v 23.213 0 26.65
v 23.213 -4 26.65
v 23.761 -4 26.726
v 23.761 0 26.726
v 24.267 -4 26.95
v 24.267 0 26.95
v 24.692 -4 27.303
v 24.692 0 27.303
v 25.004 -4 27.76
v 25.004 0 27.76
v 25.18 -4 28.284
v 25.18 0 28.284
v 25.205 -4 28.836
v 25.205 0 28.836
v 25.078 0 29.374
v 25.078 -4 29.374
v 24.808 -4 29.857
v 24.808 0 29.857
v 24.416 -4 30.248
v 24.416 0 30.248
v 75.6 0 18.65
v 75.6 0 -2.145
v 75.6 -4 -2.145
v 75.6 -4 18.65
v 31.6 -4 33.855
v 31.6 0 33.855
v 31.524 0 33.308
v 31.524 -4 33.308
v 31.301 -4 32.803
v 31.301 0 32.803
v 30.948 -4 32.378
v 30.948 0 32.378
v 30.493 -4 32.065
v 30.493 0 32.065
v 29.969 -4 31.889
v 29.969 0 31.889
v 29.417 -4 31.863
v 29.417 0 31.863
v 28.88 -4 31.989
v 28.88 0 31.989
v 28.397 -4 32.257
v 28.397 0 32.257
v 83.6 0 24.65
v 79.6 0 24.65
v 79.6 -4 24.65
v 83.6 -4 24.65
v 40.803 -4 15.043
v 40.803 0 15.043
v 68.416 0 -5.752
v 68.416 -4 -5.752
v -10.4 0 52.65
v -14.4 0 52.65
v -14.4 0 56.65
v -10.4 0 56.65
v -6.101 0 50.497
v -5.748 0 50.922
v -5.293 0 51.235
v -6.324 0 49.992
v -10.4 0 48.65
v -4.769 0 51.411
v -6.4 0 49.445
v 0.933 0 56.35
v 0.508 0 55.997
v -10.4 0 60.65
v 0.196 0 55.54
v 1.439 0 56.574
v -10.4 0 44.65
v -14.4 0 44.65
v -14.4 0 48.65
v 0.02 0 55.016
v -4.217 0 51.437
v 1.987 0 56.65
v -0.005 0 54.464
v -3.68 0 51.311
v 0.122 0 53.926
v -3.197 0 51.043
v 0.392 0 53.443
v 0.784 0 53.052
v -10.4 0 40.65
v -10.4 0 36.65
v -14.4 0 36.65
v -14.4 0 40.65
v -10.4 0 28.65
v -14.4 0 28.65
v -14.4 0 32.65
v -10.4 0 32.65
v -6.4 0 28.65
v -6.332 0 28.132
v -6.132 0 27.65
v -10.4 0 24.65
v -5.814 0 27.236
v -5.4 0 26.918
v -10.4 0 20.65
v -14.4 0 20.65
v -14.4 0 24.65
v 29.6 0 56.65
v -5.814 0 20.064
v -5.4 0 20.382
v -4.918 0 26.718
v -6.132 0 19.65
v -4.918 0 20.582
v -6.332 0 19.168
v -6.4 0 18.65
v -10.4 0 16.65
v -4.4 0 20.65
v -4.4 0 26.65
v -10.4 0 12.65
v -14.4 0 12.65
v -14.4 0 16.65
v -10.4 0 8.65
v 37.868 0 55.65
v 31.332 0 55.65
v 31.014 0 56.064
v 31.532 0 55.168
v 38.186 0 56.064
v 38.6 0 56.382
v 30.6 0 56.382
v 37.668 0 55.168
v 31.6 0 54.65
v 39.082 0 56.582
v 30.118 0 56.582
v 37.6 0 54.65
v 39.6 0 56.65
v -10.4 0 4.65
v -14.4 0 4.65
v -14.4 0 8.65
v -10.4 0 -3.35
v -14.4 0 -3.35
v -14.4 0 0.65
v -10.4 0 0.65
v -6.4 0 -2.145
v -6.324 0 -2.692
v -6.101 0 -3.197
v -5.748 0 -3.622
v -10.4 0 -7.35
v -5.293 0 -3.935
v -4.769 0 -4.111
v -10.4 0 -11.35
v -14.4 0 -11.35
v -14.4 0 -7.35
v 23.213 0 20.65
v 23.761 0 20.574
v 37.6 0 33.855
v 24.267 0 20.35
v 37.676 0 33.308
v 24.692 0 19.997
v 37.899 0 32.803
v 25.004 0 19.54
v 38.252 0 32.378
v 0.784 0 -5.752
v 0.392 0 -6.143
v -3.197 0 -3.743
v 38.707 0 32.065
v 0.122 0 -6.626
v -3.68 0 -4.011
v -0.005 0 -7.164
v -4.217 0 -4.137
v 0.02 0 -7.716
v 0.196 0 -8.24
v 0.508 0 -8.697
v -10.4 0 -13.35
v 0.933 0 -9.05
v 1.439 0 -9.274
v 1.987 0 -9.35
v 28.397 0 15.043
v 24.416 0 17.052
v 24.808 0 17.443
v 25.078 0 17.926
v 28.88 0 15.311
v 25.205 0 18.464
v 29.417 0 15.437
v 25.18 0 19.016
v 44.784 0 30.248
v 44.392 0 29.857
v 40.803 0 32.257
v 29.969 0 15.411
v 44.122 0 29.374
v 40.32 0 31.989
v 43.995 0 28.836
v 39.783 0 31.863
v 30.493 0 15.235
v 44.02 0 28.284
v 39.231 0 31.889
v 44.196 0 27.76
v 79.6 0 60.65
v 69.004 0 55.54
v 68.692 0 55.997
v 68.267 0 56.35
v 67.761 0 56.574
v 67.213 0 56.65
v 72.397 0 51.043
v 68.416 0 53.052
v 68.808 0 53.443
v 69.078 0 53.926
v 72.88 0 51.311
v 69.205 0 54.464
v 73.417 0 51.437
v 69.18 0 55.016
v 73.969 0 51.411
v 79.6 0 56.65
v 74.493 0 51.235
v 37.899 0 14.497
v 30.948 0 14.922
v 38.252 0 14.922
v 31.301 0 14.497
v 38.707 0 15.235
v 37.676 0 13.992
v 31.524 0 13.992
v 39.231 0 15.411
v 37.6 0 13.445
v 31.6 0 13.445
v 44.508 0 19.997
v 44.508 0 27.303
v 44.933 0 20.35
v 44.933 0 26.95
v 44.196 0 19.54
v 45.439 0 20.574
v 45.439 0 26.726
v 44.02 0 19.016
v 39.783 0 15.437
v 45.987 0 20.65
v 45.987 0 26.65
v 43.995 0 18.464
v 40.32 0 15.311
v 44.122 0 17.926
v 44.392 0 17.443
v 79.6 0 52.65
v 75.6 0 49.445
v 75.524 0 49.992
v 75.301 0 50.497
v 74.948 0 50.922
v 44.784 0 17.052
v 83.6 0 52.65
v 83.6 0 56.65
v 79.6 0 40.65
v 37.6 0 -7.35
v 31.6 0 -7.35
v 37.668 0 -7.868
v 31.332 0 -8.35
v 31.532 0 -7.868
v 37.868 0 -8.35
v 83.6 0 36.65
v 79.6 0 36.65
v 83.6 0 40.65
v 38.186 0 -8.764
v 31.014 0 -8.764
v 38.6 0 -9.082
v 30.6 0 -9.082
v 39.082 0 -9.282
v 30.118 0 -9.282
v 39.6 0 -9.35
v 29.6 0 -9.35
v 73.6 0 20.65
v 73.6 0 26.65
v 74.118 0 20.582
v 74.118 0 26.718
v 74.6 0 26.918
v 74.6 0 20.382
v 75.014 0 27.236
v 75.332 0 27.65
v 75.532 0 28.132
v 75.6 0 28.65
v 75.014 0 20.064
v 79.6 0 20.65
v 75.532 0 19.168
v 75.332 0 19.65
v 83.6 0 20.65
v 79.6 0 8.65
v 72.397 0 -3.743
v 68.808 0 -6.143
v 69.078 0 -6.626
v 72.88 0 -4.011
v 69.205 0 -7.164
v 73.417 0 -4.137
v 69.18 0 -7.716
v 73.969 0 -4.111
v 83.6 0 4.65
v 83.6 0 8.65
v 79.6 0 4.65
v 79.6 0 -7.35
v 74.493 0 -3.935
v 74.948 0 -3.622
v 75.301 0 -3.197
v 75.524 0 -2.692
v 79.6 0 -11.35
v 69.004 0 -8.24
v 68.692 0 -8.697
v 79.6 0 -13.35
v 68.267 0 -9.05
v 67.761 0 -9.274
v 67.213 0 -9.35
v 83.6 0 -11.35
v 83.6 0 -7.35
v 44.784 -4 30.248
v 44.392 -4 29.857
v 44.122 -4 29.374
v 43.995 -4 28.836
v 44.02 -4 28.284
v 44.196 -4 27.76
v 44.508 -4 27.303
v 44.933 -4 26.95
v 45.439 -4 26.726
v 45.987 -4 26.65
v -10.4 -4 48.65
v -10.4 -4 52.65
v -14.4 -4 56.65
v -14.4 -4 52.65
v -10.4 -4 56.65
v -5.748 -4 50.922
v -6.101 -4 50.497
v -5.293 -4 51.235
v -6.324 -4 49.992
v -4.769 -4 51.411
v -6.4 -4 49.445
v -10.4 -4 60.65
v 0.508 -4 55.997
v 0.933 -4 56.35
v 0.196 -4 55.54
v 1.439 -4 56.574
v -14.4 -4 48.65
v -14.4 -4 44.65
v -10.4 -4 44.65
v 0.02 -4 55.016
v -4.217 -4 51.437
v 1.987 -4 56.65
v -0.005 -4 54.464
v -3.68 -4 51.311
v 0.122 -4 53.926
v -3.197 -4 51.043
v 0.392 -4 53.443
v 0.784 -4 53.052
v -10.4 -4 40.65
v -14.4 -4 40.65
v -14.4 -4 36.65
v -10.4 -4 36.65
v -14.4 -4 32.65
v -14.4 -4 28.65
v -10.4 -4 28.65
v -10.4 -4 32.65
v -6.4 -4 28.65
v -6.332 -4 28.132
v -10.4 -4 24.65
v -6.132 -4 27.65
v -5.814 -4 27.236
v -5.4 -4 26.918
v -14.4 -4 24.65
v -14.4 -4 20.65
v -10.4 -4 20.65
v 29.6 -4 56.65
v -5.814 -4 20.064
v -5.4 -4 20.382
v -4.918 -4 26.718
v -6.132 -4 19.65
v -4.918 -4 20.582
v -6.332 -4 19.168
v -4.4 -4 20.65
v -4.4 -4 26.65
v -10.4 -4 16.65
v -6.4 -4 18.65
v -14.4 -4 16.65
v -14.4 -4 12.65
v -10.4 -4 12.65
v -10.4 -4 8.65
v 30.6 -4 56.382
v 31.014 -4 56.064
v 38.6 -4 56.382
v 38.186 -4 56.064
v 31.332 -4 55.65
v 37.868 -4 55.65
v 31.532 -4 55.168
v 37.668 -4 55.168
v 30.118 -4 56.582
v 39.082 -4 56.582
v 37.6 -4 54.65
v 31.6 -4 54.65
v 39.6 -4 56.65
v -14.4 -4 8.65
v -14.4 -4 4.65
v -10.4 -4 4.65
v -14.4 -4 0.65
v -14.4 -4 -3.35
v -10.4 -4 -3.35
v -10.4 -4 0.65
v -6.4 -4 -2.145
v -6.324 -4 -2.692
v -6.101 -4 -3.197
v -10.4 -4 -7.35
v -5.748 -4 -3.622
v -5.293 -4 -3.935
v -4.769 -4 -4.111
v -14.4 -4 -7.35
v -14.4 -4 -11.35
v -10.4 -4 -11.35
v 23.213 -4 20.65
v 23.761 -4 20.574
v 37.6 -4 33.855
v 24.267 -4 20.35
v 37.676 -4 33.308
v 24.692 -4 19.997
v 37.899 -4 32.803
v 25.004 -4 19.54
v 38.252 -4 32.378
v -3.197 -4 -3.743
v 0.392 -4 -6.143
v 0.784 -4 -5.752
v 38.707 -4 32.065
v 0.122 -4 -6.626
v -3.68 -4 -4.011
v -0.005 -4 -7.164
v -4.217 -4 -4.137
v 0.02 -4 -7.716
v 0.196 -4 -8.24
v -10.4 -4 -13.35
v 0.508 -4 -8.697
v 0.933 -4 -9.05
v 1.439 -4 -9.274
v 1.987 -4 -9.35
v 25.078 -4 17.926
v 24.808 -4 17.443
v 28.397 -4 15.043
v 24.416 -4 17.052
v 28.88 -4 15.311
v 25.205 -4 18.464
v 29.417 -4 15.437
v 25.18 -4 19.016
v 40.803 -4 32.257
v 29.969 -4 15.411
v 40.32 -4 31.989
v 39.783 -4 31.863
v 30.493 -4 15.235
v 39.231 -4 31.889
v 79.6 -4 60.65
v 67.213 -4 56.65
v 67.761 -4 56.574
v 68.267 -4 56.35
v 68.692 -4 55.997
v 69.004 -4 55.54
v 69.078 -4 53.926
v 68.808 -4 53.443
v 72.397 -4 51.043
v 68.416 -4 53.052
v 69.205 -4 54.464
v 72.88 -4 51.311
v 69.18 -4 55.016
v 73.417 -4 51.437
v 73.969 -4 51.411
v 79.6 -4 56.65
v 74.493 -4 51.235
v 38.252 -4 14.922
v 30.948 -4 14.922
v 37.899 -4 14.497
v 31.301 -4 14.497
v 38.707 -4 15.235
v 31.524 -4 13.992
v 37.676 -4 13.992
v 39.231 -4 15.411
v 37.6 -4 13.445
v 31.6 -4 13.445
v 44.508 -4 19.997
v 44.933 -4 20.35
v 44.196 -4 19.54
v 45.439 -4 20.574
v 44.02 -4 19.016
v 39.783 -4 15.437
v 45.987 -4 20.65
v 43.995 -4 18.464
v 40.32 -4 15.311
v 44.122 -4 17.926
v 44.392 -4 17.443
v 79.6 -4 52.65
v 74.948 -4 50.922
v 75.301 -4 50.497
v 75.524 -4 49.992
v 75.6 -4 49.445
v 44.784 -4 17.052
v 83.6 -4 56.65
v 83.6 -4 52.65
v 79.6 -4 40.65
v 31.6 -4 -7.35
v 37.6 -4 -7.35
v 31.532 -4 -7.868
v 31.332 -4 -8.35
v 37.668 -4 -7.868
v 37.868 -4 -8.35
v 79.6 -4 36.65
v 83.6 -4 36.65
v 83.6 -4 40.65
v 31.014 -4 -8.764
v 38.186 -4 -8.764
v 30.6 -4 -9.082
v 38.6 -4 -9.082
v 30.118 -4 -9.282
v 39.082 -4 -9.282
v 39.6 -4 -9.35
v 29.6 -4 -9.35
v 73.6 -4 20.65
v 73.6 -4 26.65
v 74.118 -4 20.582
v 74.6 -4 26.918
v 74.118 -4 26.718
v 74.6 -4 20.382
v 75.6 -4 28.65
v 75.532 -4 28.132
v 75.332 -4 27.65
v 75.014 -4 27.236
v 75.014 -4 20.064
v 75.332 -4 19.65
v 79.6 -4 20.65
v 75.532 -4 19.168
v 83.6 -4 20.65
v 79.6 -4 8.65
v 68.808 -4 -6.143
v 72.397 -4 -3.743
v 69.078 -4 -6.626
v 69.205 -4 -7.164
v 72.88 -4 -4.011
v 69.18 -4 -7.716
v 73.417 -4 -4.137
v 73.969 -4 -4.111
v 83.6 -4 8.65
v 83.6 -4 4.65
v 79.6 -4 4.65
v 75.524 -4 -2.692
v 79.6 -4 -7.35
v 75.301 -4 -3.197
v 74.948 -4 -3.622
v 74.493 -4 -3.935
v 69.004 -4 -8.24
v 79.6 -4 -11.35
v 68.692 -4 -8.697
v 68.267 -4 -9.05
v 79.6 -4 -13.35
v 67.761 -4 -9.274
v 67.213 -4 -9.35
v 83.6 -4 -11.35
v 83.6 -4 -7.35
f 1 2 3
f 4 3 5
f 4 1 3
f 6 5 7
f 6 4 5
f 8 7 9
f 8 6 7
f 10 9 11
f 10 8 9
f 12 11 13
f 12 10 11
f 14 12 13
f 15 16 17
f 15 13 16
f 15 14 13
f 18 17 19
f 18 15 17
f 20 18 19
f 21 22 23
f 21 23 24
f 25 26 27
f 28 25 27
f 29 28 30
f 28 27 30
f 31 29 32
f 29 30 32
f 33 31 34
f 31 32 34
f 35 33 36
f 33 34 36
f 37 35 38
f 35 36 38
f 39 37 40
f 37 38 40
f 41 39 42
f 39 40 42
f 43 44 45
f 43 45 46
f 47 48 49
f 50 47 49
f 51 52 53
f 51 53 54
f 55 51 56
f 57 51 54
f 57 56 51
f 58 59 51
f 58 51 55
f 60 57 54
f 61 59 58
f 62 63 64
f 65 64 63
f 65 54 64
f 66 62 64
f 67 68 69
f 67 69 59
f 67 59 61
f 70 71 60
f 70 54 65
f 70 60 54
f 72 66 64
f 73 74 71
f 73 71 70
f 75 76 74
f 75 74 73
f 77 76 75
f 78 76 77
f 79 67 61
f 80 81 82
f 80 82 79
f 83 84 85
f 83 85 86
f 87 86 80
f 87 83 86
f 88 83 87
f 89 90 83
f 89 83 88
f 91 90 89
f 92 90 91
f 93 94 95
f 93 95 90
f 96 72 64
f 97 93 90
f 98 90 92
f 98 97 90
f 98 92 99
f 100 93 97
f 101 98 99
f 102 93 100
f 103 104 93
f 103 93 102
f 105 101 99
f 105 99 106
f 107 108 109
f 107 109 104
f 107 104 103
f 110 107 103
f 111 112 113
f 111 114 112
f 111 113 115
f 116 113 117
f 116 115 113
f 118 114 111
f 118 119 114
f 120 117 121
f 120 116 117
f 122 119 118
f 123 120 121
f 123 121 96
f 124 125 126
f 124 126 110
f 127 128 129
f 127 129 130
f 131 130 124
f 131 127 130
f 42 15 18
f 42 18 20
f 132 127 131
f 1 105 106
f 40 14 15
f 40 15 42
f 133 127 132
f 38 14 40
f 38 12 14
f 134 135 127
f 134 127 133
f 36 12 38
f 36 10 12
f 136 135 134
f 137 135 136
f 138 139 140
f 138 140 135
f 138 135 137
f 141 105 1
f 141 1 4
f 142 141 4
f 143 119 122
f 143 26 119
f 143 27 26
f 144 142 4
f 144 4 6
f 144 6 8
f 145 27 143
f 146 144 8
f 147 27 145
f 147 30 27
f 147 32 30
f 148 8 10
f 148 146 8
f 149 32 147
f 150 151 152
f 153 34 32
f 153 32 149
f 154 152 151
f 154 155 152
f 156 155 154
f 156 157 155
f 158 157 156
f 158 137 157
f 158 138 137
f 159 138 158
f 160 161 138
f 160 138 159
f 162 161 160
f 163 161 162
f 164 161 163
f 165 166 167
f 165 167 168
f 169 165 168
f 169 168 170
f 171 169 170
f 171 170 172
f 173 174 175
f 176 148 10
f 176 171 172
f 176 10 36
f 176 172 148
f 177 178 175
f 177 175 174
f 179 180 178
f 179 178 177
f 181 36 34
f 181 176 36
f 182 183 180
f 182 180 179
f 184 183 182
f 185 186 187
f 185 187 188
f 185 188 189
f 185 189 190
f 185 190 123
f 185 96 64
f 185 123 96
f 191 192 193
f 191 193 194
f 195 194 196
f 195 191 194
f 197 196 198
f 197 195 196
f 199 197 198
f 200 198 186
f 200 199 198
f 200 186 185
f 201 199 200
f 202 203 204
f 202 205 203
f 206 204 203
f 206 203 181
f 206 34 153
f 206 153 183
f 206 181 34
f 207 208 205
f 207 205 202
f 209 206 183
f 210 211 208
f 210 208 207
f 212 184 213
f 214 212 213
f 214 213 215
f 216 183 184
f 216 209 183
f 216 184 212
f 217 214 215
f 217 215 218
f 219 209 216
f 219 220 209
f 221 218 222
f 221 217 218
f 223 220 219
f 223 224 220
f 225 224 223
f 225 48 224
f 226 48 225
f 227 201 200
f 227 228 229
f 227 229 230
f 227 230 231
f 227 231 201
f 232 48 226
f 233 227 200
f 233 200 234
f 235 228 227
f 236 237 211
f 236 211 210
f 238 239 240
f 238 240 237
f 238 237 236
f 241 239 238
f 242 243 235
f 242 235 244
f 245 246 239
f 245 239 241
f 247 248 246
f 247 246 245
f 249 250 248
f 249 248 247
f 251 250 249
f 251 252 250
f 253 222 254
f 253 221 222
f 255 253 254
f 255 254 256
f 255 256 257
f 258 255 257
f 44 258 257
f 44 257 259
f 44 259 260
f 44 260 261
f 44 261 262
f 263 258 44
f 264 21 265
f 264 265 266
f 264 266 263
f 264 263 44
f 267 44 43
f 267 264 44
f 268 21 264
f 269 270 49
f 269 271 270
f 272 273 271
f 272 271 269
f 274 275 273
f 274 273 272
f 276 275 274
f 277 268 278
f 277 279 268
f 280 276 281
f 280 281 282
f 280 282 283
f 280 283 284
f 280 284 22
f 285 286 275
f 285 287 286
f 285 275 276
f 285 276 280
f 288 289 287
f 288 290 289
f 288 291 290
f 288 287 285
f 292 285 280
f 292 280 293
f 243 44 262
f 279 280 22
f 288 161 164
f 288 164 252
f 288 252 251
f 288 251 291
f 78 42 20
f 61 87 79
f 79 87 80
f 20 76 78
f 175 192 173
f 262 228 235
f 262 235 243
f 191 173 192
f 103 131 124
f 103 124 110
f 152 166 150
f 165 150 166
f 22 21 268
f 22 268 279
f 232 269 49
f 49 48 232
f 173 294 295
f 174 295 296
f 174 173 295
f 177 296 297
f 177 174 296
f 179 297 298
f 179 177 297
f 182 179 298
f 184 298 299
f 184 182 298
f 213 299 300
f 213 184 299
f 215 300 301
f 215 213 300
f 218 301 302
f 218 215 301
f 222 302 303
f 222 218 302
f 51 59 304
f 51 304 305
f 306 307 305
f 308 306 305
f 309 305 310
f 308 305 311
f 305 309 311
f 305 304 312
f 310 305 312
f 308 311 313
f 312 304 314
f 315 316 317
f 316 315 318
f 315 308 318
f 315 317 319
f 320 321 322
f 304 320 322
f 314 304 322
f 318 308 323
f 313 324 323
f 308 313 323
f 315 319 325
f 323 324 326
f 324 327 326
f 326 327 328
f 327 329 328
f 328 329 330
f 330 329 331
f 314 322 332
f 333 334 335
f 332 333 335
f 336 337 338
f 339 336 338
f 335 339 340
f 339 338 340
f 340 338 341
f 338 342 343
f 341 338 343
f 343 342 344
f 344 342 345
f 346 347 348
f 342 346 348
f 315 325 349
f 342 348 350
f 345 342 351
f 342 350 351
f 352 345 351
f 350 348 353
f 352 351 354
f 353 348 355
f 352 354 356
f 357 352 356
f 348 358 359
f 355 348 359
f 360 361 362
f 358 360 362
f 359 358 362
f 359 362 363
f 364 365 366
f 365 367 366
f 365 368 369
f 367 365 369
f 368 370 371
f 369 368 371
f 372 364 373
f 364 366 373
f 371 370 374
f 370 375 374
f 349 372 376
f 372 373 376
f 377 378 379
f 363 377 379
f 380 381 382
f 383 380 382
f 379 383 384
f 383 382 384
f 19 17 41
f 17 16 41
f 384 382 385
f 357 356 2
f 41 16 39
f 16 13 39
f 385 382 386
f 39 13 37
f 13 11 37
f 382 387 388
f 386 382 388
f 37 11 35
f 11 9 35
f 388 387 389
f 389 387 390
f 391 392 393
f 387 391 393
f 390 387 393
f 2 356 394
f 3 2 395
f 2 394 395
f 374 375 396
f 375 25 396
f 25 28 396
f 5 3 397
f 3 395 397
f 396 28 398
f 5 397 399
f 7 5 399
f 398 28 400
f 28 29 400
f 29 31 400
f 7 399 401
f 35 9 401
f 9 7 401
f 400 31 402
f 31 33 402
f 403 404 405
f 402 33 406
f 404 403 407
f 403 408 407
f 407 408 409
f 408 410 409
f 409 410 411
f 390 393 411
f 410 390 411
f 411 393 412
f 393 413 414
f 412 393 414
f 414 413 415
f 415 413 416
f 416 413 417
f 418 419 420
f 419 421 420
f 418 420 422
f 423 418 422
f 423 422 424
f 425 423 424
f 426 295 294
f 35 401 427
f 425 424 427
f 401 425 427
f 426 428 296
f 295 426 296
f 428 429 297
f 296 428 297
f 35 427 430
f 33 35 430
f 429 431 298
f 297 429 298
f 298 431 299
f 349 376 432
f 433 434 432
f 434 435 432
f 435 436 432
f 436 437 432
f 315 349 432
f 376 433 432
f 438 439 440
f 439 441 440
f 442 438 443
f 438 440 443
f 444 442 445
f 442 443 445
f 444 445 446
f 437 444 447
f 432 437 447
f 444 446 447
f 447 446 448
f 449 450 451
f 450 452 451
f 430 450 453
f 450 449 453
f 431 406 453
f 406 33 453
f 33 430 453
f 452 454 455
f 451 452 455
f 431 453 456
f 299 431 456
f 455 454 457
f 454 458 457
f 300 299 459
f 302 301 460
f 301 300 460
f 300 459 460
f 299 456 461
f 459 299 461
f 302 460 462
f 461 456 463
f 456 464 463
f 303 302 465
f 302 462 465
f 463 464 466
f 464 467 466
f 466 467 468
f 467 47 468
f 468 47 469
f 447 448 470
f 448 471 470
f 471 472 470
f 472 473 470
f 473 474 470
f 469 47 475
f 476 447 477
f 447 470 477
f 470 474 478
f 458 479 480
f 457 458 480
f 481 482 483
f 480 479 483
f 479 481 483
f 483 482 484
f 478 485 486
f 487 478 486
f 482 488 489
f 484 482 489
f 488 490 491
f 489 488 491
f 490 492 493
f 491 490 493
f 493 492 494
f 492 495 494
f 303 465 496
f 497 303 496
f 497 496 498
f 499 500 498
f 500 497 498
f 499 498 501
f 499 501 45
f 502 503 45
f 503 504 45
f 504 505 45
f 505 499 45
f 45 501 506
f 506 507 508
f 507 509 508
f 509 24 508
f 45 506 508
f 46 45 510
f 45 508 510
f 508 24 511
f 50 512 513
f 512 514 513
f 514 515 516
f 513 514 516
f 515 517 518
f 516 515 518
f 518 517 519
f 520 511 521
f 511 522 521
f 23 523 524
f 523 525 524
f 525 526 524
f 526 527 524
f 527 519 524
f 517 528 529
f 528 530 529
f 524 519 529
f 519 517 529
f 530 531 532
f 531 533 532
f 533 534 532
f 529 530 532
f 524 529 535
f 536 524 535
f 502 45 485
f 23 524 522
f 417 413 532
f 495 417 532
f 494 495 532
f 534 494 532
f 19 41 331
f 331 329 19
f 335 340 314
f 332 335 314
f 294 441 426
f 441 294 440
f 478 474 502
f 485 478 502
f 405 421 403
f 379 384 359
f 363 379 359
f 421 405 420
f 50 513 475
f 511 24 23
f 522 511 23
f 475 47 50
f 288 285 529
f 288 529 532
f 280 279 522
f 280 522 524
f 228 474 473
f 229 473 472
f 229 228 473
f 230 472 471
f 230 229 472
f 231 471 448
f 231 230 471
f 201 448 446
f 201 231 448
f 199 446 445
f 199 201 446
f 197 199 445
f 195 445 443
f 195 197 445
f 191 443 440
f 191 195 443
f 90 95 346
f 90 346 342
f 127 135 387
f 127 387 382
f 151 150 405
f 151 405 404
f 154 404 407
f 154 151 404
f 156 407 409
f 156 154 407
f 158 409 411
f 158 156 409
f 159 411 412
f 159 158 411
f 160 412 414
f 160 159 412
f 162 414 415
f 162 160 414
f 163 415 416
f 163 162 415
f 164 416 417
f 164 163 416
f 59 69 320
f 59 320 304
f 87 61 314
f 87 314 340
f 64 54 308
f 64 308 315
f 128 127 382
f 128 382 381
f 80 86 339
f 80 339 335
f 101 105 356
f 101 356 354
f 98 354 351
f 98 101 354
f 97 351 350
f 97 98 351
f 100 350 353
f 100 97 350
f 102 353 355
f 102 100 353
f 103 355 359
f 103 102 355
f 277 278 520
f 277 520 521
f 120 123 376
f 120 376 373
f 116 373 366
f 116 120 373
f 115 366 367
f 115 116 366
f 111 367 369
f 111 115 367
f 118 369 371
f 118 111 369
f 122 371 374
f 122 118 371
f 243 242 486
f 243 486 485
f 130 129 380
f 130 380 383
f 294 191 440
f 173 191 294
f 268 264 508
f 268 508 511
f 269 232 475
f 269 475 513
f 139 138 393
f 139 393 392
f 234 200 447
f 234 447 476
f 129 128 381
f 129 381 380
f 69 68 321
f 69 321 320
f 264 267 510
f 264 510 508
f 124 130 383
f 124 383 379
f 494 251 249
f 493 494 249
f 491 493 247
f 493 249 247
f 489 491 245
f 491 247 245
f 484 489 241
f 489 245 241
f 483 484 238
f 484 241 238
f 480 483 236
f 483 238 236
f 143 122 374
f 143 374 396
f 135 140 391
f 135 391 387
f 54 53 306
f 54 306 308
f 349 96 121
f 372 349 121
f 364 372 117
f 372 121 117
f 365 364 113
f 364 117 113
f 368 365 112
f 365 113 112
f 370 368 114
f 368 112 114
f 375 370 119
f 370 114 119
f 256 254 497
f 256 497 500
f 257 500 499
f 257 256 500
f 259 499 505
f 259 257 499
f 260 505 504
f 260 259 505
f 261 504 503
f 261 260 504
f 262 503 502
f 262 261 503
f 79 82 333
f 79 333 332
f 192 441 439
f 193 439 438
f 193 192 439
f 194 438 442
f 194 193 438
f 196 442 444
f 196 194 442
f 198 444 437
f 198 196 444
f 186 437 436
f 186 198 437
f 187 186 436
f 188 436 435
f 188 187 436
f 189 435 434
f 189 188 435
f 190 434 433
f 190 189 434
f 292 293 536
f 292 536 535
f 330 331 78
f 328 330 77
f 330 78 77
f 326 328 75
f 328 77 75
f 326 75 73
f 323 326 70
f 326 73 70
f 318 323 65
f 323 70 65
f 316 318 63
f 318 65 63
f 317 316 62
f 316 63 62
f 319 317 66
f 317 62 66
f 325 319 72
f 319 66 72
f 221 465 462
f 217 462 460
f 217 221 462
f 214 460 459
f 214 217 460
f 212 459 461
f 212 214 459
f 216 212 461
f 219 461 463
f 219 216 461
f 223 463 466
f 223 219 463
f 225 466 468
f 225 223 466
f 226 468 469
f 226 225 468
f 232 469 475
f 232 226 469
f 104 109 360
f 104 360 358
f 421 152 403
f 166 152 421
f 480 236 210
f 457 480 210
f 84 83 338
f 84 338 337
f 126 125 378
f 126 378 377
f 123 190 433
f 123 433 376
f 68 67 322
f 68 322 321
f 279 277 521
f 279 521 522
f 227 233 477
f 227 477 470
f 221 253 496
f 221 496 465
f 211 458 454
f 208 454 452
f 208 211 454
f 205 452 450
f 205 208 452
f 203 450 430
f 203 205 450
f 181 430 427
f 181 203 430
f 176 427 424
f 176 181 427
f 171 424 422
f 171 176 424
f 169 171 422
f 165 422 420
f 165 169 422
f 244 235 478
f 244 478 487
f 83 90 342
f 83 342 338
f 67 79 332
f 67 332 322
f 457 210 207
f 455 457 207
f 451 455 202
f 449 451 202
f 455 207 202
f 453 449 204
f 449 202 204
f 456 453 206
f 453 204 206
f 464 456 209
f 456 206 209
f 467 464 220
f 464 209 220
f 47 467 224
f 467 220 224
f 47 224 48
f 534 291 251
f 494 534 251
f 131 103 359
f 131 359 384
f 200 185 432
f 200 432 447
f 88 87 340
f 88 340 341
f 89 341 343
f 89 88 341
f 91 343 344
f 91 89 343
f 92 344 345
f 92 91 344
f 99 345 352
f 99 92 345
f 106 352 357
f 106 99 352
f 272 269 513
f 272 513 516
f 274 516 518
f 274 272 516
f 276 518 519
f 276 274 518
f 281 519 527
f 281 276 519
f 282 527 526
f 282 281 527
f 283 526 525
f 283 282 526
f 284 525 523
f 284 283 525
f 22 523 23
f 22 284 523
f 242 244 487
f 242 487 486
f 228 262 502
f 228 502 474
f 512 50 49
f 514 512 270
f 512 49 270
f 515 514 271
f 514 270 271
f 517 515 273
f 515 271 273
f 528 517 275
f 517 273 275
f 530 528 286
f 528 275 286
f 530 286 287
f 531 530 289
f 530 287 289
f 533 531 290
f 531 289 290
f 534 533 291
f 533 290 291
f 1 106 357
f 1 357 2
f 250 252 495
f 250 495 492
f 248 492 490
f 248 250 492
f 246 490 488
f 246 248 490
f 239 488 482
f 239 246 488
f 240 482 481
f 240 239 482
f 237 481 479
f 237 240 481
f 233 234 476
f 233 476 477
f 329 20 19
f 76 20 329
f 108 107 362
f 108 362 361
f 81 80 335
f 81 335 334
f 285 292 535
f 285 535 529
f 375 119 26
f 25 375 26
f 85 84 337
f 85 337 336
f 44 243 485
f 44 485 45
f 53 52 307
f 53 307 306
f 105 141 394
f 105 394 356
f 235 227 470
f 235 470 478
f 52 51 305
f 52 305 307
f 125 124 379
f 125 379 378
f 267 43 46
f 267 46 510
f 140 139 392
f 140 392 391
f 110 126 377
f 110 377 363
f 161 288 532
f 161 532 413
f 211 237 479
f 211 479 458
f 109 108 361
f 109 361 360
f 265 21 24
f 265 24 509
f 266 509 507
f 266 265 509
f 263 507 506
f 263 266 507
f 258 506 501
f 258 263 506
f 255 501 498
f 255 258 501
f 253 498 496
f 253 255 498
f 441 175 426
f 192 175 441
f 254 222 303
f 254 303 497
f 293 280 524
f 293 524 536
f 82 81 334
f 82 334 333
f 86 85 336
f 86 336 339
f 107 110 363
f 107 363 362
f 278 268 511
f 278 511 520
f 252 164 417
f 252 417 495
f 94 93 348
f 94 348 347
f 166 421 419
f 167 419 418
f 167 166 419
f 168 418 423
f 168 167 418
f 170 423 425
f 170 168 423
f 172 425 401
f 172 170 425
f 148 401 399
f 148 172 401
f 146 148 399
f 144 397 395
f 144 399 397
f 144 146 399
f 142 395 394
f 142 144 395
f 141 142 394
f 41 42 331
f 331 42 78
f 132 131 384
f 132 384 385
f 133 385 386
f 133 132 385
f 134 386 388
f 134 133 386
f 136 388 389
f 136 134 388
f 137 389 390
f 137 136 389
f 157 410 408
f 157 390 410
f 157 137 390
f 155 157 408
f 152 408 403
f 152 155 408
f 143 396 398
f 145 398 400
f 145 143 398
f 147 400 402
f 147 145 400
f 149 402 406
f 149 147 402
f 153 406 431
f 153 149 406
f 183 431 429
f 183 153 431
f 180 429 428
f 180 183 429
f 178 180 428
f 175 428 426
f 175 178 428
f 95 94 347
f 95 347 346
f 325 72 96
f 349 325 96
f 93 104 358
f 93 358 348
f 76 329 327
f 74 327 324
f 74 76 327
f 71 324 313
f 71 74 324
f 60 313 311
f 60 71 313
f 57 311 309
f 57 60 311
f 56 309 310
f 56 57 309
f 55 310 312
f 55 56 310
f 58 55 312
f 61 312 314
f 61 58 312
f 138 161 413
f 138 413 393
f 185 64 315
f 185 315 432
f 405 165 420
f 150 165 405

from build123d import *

# Parameters (mm, degrees)
BOSS_EXTRUDE1_DEPTH = 4
CUT_EXTRUDE1_DEPTH  = 10


with BuildPart() as part:
    # Sketch1 → Boss-Extrude1 (new body)
    with BuildSketch(Plane(origin=(0, 0, 0), x_dir=(1, 0, 0), z_dir=(0, 1, 0))):
        Polygon((-10.4, 13.35), (-10.4, 11.35), (-14.4, 11.35), (-14.4, 7.35), (-10.4, 7.35), (-10.4, 3.35), (-14.4, 3.35), (-14.4, -0.65), (-10.4, -0.65), (-10.4, -4.65), (-14.4, -4.65), (-14.4, -8.65), (-10.4, -8.65), (-10.4, -12.65), (-14.4, -12.65), (-14.4, -16.65), (-10.4, -16.65), (-10.4, -20.65), (-14.4, -20.65), (-14.4, -24.65), (-10.4, -24.65), (-10.4, -28.65), (-14.4, -28.65), (-14.4, -32.65), (-10.4, -32.65), (-10.4, -36.65), (-14.4, -36.65), (-14.4, -40.65), (-10.4, -40.65), (-10.4, -44.65), (-14.4, -44.65), (-14.4, -48.65), (-10.4, -48.65), (-10.4, -52.65), (-14.4, -52.65), (-14.4, -56.65), (-10.4, -56.65), (-10.4, -60.65), (79.6, -60.65), (79.6, -56.65), (83.6, -56.65), (83.6, -52.65), (79.6, -52.65), (79.6, -40.65), (83.6, -40.65), (83.6, -36.65), (79.6, -36.65), (79.6, -24.65), (83.6, -24.65), (83.6, -20.65), (79.6, -20.65), (79.6, -8.65), (83.6, -8.65), (83.6, -4.65), (79.6, -4.65), (79.6, 7.35), (83.6, 7.35), (83.6, 11.35), (79.6, 11.35), (79.6, 13.35), align=None)
    extrude(amount=-BOSS_EXTRUDE1_DEPTH)

    # Sketch2 → Cut-Extrude1 (cut)
    with BuildSketch(Plane(origin=(0, 0, 0), x_dir=(1, 0, 0), z_dir=(0, 1, 0))):
        with BuildLine():
            Line((1.986692504, 9.35), (29.6, 9.35))
            ThreePointArc((29.6, 9.35), (31.014213562, 8.764213562), (31.6, 7.35))
            Line((31.6, 7.35), (31.6, -13.44487837))
            ThreePointArc((31.6, -13.44487837), (30.492669396, -15.23461057), (28.39685865, -15.042517532))
            Line((28.39685865, -15.042517532), (0.783551154, 5.752360838))
            ThreePointArc((0.783551154, 5.752360838), (0.089948145, 7.984319192), (1.986692504, 9.35))
        make_face()
        with BuildLine():
            ThreePointArc((-6.4, 2.14487837), (-5.292669396, 3.93461057), (-3.19685865, 3.742517532))
            Line((-3.19685865, 3.742517532), (24.416448846, -17.052360838))
            ThreePointArc((24.416448846, -17.052360838), (25.110051855, -19.284319192), (23.213307496, -20.65))
            Line((23.213307496, -20.65), (-4.4, -20.65))
            ThreePointArc((-4.4, -20.65), (-5.814213562, -20.064213562), (-6.4, -18.65))
            Line((-6.4, -18.65), (-6.4, 2.14487837))
        make_face()
        with BuildLine():
            Line((37.6, 7.35), (37.6, -13.44487837))
            ThreePointArc((37.6, -13.44487837), (38.707330604, -15.23461057), (40.80314135, -15.042517532))
            Line((40.80314135, -15.042517532), (68.416448846, 5.752360838))
            ThreePointArc((68.416448846, 5.752360838), (69.110051855, 7.984319192), (67.213307496, 9.35))
            Line((67.213307496, 9.35), (39.6, 9.35))
            ThreePointArc((39.6, 9.35), (38.185786438, 8.764213562), (37.6, 7.35))
        make_face()
        with BuildLine():
            ThreePointArc((75.6, -18.65), (75.014213562, -20.064213562), (73.6, -20.65))
            Line((73.6, -20.65), (45.986692504, -20.65))
            ThreePointArc((45.986692504, -20.65), (44.089948145, -19.284319192), (44.783551154, -17.052360838))
            Line((44.783551154, -17.052360838), (72.39685865, 3.742517532))
            ThreePointArc((72.39685865, 3.742517532), (74.492669396, 3.93461057), (75.6, 2.14487837))
            Line((75.6, 2.14487837), (75.6, -18.65))
        make_face()
        with BuildLine():
            ThreePointArc((75.6, -49.44487837), (74.492669396, -51.23461057), (72.39685865, -51.042517532))
            Line((72.39685865, -51.042517532), (44.783551154, -30.247639162))
            ThreePointArc((44.783551154, -30.247639162), (44.089948145, -28.015680808), (45.986692504, -26.65))
            Line((45.986692504, -26.65), (73.6, -26.65))
            ThreePointArc((73.6, -26.65), (75.014213562, -27.235786438), (75.6, -28.65))
            Line((75.6, -28.65), (75.6, -49.44487837))
        make_face()
        with BuildLine():
            Line((67.213307496, -56.65), (39.6, -56.65))
            ThreePointArc((39.6, -56.65), (38.185786438, -56.064213562), (37.6, -54.65))
            Line((37.6, -54.65), (37.6, -33.85512163))
            ThreePointArc((37.6, -33.85512163), (38.707330604, -32.06538943), (40.80314135, -32.257482468))
            Line((40.80314135, -32.257482468), (68.416448846, -53.052360838))
            ThreePointArc((68.416448846, -53.052360838), (69.110051855, -55.284319192), (67.213307496, -56.65))
        make_face()
        with BuildLine():
            Line((31.6, -54.65), (31.6, -33.85512163))
            ThreePointArc((31.6, -33.85512163), (30.492669396, -32.06538943), (28.39685865, -32.257482468))
            Line((28.39685865, -32.257482468), (0.783551154, -53.052360838))
            ThreePointArc((0.783551154, -53.052360838), (0.089948145, -55.284319192), (1.986692504, -56.65))
            Line((1.986692504, -56.65), (29.6, -56.65))
            ThreePointArc((29.6, -56.65), (31.014213562, -56.064213562), (31.6, -54.65))
        make_face()
        with BuildLine():
            ThreePointArc((-6.4, -28.65), (-5.814213562, -27.235786438), (-4.4, -26.65))
            Line((-4.4, -26.65), (23.213307496, -26.65))
            ThreePointArc((23.213307496, -26.65), (25.110051855, -28.015680808), (24.416448846, -30.247639162))
            Line((24.416448846, -30.247639162), (-3.19685865, -51.042517532))
            ThreePointArc((-3.19685865, -51.042517532), (-5.292669396, -51.23461057), (-6.4, -49.44487837))
            Line((-6.4, -49.44487837), (-6.4, -28.65))
        make_face()
    extrude(amount=-CUT_EXTRUDE1_DEPTH, mode=Mode.SUBTRACT)


solid = part.part
